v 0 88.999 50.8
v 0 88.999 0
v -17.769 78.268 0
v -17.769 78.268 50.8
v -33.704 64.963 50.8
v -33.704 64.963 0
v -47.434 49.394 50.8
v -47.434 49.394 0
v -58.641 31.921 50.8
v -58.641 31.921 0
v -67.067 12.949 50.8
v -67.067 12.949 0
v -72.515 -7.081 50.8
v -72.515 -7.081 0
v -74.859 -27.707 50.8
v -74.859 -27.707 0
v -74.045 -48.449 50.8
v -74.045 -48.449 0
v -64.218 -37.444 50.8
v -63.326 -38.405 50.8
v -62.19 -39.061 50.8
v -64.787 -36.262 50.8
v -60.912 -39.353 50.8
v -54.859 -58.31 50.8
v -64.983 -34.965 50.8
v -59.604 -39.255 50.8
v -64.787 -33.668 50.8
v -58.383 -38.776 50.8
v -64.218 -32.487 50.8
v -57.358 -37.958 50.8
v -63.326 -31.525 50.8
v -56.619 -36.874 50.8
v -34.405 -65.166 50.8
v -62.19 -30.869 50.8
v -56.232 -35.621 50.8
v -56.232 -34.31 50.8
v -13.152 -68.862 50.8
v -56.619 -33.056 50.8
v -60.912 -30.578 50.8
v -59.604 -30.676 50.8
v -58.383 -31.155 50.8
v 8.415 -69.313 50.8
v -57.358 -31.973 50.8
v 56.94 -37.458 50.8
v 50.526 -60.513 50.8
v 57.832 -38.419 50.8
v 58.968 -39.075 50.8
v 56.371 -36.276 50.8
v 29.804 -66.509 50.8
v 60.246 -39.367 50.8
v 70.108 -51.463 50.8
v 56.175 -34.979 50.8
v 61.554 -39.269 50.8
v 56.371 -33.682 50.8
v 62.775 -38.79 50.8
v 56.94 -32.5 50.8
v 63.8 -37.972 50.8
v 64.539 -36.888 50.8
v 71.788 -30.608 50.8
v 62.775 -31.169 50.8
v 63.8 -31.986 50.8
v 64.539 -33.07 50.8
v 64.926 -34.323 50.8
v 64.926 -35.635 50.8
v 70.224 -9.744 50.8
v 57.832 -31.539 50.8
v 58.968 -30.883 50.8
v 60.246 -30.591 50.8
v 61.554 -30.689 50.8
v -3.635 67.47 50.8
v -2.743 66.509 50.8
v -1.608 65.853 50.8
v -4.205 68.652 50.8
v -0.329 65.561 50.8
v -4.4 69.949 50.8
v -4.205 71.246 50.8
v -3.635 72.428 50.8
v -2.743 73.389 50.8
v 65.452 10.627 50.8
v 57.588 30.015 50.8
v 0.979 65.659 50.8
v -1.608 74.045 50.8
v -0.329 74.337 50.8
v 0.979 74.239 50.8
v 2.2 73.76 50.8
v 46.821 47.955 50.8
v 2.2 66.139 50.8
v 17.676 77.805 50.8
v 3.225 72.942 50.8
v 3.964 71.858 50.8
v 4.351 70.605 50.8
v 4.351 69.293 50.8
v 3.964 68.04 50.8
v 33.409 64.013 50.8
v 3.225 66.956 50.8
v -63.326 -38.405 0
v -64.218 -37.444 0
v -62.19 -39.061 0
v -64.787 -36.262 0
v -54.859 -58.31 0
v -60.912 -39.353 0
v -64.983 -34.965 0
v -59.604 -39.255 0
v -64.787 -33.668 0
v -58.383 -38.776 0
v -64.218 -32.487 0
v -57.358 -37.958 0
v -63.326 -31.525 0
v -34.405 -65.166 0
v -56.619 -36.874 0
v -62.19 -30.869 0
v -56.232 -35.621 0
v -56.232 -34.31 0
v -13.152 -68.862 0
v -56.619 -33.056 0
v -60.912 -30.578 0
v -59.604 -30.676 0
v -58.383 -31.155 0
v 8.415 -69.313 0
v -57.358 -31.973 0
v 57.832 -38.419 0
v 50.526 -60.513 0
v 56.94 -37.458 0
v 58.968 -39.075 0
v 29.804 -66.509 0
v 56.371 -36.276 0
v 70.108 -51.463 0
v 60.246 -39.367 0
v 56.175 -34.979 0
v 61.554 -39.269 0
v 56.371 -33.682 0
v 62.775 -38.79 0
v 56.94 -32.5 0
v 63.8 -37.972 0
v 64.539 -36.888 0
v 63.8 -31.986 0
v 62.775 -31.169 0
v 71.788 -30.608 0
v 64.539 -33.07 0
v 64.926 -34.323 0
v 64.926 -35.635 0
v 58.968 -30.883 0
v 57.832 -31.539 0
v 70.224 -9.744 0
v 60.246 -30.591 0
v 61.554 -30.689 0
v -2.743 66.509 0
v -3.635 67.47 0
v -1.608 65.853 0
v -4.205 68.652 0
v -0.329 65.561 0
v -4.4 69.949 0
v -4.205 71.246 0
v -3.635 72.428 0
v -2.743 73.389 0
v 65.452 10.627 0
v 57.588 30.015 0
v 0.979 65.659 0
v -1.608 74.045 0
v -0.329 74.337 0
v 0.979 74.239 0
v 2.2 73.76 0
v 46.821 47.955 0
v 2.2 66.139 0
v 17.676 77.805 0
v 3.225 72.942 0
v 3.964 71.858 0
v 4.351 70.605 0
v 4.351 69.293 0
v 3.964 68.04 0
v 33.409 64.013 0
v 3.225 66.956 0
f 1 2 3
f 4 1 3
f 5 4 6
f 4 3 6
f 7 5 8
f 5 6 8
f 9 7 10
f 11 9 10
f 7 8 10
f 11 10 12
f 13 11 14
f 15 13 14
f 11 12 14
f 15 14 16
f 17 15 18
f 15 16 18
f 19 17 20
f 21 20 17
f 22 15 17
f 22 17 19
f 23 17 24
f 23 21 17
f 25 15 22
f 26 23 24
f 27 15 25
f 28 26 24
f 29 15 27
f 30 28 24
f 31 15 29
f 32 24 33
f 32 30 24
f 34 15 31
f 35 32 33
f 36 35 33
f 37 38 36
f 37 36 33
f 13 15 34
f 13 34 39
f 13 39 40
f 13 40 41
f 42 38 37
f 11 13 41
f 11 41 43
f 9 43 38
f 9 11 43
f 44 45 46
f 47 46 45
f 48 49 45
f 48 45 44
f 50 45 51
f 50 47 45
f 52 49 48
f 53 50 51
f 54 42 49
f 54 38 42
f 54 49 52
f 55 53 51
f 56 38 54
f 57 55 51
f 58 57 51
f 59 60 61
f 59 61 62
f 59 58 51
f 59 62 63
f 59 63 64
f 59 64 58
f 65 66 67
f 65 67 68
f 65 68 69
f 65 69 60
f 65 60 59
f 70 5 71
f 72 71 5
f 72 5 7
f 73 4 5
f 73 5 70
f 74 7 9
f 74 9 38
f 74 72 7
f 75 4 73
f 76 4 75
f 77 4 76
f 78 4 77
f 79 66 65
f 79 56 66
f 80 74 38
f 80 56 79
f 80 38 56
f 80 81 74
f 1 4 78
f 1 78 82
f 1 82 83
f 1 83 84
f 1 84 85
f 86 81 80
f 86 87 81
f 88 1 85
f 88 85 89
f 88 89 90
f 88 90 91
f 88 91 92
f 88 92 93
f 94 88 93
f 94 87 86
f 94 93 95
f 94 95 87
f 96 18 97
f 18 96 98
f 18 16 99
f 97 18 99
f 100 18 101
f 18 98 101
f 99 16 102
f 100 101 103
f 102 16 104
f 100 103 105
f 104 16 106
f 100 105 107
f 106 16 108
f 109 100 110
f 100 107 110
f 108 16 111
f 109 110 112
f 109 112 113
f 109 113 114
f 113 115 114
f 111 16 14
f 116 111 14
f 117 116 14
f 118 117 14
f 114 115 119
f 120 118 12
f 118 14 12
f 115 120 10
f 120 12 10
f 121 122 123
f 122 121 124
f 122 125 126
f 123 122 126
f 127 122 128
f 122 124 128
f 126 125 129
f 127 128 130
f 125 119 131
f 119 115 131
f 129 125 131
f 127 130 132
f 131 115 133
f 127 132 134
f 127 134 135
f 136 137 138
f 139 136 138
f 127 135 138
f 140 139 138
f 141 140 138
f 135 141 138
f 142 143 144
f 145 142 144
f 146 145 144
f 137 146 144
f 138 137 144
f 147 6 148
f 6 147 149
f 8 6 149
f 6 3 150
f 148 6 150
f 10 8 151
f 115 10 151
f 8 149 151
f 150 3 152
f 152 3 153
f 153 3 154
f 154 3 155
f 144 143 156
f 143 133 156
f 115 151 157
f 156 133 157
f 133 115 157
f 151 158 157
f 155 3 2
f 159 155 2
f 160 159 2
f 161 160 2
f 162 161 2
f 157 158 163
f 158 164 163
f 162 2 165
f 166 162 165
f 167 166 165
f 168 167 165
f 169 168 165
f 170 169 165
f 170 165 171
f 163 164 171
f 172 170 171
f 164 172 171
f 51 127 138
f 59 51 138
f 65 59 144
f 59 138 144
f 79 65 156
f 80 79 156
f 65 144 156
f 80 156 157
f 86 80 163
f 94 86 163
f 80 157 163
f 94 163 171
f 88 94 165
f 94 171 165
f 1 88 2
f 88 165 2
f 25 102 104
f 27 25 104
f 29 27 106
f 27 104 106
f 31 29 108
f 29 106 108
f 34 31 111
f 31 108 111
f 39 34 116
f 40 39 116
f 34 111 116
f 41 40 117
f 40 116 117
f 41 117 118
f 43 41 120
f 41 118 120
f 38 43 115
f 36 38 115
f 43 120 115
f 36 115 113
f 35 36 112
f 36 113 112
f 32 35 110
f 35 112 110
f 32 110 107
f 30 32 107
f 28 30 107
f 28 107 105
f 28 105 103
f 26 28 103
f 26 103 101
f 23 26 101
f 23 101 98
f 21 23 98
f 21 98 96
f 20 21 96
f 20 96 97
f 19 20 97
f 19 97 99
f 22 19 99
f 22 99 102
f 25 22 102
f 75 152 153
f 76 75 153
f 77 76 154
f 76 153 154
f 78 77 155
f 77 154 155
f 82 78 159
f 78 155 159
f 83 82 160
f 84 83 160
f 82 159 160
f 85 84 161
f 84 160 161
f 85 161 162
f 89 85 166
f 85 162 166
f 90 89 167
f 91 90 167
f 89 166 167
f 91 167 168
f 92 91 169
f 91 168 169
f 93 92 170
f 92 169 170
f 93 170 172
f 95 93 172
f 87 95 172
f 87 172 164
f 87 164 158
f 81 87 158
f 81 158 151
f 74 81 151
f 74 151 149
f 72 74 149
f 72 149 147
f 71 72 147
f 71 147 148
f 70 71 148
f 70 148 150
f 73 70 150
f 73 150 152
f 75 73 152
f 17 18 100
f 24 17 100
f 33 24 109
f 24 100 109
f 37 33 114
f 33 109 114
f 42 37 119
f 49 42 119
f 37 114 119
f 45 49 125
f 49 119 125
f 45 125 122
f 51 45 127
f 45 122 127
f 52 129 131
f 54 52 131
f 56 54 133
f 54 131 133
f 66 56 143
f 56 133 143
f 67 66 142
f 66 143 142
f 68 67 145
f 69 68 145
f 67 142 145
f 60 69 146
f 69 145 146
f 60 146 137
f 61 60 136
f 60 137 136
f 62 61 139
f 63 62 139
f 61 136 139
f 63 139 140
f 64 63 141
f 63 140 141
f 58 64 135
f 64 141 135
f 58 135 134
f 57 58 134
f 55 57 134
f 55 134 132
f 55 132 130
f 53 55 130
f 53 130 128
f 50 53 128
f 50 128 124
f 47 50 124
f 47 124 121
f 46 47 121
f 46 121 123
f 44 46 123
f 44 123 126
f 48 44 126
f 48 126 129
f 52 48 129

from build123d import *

# Parameters (mm, degrees)
PAD_DEPTH  = 50.8
SKETCH_R   = 4.4
HOLE_DEPTH = 50.801


with BuildPart() as part:
    # Sketch001 → Pad (new body)
    with BuildSketch(Plane.XY):
        with BuildLine():
            ThreePointArc((0, 88.9991), (-58.64132, 31.921047), (-74.045407, -48.449486))
            ThreePointArc((-74.045407, -48.449486), (-2.377196, -69.495491), (70.107976, -51.46311))
            ThreePointArc((70.107976, -51.46311), (57.587958, 30.015227), (0, 88.9991))
        make_face()
    extrude(amount=PAD_DEPTH)

    # Sketch (on Sketch) → Hole (cut, through all)
    with BuildSketch(Plane(origin=(0, 0, 0), x_dir=(-1, 0, 0), z_dir=(0, 0, -1))):
        with Locations((-60.575023, -34.979102)):
            Circle(SKETCH_R)
        with Locations((0, 69.9491)):
            Circle(SKETCH_R)
        with Locations((60.582976, -34.965326)):
            Circle(SKETCH_R)
    extrude(amount=-HOLE_DEPTH, mode=Mode.SUBTRACT)


solid = part.part
